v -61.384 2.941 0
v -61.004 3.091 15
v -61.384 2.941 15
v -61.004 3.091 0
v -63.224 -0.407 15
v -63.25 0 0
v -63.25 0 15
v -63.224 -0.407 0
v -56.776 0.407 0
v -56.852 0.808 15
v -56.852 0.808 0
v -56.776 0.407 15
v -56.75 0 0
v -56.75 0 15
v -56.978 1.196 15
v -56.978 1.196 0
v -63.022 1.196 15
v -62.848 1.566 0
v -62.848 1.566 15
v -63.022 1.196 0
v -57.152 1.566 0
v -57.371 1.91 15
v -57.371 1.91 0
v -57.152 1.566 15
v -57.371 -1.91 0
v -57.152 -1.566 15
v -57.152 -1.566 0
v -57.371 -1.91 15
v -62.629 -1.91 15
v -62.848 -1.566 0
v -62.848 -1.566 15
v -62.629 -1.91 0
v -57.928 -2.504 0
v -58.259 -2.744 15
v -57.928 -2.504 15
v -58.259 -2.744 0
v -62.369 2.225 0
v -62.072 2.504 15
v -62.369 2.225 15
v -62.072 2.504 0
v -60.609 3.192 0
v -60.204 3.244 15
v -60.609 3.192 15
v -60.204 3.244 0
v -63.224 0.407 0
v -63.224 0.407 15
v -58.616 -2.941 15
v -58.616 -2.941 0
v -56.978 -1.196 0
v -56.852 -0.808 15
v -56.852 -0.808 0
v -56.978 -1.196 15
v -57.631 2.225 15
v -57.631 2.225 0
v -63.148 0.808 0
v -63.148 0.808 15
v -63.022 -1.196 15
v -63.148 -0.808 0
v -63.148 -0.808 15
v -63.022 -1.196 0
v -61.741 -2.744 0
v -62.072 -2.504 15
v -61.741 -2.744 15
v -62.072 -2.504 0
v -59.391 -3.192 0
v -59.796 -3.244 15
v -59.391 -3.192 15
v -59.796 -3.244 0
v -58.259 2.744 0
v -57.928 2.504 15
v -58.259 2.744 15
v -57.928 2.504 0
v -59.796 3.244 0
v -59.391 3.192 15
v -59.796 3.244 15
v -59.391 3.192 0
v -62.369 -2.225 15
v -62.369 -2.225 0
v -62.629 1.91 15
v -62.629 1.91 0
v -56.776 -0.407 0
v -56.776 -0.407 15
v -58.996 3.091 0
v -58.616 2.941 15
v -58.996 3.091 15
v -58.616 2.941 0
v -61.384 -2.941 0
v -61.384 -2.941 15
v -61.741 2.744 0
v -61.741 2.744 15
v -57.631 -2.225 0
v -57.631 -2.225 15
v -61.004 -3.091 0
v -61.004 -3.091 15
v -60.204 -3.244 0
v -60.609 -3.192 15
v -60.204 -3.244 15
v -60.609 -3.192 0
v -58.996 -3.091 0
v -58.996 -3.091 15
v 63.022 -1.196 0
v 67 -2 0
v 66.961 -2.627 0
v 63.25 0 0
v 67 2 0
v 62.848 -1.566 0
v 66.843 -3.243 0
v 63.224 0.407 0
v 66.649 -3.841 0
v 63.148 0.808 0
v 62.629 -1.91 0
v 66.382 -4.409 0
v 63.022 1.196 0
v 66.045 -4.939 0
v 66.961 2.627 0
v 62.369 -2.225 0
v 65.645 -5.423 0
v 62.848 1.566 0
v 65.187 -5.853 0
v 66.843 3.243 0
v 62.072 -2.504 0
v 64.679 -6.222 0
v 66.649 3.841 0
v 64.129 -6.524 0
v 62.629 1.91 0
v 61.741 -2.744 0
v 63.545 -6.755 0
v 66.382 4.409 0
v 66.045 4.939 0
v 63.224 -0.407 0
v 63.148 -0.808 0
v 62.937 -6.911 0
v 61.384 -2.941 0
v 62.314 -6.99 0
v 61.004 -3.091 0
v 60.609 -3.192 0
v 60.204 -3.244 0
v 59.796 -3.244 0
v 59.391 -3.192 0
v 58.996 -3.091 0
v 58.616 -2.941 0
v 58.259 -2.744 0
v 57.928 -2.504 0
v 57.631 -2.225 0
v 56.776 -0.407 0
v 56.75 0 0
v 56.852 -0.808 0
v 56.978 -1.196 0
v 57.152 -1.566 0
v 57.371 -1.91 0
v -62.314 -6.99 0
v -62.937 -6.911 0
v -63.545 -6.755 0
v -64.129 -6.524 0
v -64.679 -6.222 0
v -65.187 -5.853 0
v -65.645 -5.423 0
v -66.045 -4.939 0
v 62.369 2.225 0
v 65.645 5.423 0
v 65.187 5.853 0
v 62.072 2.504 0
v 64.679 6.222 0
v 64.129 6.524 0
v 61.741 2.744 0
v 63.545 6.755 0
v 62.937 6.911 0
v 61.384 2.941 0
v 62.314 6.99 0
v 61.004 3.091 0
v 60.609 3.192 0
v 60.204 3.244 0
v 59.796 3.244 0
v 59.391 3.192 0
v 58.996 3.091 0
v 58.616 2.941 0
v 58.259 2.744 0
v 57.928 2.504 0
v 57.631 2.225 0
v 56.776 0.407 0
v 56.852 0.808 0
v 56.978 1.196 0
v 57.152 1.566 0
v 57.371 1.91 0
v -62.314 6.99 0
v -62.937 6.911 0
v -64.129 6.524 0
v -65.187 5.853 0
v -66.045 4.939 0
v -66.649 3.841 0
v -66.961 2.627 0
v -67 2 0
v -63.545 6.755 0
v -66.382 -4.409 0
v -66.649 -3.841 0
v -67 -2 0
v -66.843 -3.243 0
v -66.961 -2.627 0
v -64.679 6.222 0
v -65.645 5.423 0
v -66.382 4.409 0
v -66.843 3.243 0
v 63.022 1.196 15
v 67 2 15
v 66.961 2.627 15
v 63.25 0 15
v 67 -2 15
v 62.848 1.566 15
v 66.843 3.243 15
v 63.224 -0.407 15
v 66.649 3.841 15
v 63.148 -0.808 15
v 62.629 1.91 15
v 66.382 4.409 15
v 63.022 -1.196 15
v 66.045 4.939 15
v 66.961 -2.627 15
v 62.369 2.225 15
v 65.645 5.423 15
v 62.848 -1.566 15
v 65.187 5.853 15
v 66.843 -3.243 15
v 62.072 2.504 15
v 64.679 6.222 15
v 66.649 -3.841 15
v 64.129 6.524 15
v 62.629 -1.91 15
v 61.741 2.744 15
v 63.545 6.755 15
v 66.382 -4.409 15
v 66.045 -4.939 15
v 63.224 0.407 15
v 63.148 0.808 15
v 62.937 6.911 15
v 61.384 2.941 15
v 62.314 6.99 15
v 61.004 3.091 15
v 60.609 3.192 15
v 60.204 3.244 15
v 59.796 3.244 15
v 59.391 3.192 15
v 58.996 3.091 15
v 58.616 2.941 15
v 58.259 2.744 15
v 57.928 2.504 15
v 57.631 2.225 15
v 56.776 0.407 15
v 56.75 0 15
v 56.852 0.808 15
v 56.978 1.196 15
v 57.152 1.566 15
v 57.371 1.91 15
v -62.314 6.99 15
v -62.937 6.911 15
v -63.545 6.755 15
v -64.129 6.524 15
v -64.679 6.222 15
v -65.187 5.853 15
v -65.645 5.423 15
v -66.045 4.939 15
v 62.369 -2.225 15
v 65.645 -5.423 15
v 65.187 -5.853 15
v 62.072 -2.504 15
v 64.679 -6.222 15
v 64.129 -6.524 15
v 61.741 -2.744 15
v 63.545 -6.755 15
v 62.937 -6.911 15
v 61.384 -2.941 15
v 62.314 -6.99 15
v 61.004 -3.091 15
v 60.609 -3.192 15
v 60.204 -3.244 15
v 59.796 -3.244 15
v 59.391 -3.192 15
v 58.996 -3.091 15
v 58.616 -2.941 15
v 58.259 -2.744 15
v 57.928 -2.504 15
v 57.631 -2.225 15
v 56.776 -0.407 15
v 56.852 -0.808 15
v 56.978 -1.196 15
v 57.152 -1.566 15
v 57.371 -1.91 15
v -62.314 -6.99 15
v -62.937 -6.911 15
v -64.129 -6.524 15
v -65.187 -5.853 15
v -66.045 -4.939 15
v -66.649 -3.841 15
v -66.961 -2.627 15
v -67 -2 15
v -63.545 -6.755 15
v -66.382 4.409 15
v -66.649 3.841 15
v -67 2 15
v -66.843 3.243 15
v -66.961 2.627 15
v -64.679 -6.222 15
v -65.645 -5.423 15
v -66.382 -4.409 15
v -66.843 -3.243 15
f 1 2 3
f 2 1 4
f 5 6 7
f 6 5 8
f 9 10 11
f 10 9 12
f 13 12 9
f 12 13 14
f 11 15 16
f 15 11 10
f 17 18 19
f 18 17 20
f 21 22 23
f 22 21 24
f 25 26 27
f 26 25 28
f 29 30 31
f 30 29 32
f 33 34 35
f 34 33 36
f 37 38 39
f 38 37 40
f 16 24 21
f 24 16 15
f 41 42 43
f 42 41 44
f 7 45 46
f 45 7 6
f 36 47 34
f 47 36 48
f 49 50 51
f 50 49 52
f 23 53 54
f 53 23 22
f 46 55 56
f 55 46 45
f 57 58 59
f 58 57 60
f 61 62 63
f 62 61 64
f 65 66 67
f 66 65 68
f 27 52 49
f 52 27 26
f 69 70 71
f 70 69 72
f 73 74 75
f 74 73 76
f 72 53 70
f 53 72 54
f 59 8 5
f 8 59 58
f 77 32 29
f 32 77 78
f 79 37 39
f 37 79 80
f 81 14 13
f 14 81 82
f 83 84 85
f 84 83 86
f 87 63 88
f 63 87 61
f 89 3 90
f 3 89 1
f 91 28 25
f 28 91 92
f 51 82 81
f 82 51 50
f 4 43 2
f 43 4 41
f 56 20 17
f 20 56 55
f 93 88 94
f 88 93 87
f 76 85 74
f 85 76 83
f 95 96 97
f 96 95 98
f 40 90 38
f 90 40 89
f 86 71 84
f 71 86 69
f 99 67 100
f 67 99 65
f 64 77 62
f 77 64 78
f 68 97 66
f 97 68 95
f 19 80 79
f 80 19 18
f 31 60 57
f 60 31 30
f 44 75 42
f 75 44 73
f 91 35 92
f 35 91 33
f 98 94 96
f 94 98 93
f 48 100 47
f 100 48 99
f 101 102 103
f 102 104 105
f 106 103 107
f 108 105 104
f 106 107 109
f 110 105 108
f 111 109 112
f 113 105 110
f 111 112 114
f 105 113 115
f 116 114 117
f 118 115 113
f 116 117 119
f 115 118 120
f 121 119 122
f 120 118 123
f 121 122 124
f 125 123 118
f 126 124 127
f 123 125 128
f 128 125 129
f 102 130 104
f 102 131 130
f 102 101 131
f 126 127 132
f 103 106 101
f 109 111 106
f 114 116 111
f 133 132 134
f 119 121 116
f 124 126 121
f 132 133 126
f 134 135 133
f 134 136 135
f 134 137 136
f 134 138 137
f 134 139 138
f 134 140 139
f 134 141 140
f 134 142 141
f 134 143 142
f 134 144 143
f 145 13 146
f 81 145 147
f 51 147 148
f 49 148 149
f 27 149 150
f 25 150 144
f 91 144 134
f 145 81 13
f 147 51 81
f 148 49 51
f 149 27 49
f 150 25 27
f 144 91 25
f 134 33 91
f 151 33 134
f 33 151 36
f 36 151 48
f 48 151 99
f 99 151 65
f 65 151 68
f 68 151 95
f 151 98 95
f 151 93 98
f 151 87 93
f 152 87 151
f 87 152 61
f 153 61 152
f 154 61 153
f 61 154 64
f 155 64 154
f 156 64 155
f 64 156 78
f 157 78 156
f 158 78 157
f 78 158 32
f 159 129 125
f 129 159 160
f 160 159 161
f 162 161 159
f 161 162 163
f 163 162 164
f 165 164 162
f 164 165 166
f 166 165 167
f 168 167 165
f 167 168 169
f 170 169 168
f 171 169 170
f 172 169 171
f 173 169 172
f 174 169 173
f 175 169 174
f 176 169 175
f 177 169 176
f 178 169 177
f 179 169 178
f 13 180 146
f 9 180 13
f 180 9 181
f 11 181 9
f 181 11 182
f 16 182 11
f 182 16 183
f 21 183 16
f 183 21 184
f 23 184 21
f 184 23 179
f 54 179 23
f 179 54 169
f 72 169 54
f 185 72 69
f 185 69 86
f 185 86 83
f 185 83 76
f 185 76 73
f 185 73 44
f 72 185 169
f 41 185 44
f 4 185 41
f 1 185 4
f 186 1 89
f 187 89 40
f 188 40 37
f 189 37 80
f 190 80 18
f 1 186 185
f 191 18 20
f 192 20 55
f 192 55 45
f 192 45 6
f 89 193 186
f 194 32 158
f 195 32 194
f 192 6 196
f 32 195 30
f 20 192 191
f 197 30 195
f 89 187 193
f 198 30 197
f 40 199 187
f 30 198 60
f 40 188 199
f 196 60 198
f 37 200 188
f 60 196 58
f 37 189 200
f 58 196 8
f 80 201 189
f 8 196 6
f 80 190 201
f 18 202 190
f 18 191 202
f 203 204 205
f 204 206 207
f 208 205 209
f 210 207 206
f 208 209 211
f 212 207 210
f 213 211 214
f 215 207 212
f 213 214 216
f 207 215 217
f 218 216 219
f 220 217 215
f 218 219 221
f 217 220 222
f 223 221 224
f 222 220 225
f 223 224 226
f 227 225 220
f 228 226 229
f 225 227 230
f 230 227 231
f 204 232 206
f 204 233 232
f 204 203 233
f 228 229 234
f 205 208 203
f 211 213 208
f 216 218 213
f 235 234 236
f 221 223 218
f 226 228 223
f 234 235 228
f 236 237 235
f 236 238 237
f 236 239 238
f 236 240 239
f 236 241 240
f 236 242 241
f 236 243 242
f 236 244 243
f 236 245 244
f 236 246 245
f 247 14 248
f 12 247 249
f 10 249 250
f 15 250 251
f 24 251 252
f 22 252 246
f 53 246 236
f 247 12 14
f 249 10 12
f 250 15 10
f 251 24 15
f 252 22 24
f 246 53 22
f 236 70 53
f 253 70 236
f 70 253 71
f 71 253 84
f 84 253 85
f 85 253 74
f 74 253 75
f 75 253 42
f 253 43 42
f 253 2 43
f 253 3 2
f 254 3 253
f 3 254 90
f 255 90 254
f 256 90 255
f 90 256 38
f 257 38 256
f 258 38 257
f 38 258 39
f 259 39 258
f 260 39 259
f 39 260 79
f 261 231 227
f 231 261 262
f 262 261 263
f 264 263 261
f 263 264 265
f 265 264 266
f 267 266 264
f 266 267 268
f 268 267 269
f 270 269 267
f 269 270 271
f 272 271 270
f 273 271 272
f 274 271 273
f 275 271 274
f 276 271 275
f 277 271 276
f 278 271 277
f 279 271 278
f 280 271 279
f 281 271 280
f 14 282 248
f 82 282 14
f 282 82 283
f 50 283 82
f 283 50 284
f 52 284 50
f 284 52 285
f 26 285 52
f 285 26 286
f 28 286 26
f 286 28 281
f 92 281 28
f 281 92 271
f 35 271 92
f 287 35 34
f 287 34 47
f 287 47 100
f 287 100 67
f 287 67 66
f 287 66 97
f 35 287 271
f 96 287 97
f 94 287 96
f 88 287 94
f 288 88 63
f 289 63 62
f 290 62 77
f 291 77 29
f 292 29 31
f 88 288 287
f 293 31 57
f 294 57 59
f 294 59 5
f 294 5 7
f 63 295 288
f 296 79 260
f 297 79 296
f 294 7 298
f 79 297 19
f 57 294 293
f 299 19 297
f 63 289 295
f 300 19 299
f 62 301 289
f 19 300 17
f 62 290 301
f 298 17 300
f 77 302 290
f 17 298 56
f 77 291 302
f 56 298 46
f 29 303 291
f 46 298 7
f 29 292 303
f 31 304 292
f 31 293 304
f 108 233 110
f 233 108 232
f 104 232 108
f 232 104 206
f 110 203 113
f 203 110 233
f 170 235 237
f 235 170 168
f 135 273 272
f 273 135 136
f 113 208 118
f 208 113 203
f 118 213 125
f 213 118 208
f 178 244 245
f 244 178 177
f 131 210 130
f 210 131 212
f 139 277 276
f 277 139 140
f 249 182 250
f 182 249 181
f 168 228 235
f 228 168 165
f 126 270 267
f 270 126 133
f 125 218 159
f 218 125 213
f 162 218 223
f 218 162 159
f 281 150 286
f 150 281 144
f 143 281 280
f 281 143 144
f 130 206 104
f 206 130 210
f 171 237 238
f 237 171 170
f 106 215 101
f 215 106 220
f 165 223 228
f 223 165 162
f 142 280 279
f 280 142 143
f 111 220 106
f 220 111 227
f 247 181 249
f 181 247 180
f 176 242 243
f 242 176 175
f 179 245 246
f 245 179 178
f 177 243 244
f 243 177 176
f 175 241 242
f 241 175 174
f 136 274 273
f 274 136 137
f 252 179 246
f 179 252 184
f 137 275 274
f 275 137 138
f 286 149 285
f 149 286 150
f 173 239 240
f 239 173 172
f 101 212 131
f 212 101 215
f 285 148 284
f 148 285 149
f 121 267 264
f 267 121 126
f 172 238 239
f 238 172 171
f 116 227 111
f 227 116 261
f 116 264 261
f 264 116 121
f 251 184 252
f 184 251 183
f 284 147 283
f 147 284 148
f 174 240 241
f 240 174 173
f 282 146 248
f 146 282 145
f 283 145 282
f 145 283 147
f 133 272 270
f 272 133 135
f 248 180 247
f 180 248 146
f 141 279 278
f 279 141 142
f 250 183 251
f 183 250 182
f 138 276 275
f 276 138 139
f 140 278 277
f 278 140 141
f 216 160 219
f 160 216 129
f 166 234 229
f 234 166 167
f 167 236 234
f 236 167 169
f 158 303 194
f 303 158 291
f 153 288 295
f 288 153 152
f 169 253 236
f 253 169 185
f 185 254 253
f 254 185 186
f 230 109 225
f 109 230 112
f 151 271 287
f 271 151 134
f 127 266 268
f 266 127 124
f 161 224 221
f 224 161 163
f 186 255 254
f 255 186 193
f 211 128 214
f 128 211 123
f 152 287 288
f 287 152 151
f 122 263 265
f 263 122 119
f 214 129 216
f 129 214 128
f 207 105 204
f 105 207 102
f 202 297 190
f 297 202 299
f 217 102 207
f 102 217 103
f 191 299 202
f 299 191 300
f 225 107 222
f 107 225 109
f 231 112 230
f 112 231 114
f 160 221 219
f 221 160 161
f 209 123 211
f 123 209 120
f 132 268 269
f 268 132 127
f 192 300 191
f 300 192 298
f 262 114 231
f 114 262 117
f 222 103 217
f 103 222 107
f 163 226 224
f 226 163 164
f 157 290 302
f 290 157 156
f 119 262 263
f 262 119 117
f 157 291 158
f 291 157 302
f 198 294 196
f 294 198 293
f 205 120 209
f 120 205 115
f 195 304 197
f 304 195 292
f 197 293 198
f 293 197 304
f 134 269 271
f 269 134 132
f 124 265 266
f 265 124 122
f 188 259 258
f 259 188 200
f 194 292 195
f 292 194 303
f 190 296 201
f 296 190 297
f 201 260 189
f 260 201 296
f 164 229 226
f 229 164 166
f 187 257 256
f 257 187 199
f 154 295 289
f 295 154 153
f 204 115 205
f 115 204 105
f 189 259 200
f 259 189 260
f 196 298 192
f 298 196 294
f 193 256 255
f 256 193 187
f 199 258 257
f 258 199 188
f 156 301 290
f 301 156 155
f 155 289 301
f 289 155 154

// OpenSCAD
$fn = 50;


difference() {
	union() {
		hull() {
			translate(v = [-62.0000000000, 2.0000000000, 0]) {
				cylinder(h = 15, r = 5);
			}
			translate(v = [62.0000000000, 2.0000000000, 0]) {
				cylinder(h = 15, r = 5);
			}
			translate(v = [-62.0000000000, -2.0000000000, 0]) {
				cylinder(h = 15, r = 5);
			}
			translate(v = [62.0000000000, -2.0000000000, 0]) {
				cylinder(h = 15, r = 5);
			}
		}
	}
	union() {
		translate(v = [-60.0000000000, 0.0000000000, 0]) {
			cylinder(h = 15, r = 3.2500000000);
		}
		translate(v = [60.0000000000, 0.0000000000, 0]) {
			cylinder(h = 15, r = 3.2500000000);
		}
		translate(v = [-60.0000000000, 0.0000000000, 0]) {
			cylinder(h = 15, r = 1.8000000000);
		}
		translate(v = [60.0000000000, 0.0000000000, 0]) {
			cylinder(h = 15, r = 1.8000000000);
		}
		translate(v = [-60.0000000000, 0.0000000000, 0]) {
			cylinder(h = 15, r = 1.8000000000);
		}
		translate(v = [60.0000000000, 0.0000000000, 0]) {
			cylinder(h = 15, r = 1.8000000000);
		}
		translate(v = [-60.0000000000, 0.0000000000, 0]) {
			cylinder(h = 15, r = 1.8000000000);
		}
		translate(v = [60.0000000000, 0.0000000000, 0]) {
			cylinder(h = 15, r = 1.8000000000);
		}
	}
}
